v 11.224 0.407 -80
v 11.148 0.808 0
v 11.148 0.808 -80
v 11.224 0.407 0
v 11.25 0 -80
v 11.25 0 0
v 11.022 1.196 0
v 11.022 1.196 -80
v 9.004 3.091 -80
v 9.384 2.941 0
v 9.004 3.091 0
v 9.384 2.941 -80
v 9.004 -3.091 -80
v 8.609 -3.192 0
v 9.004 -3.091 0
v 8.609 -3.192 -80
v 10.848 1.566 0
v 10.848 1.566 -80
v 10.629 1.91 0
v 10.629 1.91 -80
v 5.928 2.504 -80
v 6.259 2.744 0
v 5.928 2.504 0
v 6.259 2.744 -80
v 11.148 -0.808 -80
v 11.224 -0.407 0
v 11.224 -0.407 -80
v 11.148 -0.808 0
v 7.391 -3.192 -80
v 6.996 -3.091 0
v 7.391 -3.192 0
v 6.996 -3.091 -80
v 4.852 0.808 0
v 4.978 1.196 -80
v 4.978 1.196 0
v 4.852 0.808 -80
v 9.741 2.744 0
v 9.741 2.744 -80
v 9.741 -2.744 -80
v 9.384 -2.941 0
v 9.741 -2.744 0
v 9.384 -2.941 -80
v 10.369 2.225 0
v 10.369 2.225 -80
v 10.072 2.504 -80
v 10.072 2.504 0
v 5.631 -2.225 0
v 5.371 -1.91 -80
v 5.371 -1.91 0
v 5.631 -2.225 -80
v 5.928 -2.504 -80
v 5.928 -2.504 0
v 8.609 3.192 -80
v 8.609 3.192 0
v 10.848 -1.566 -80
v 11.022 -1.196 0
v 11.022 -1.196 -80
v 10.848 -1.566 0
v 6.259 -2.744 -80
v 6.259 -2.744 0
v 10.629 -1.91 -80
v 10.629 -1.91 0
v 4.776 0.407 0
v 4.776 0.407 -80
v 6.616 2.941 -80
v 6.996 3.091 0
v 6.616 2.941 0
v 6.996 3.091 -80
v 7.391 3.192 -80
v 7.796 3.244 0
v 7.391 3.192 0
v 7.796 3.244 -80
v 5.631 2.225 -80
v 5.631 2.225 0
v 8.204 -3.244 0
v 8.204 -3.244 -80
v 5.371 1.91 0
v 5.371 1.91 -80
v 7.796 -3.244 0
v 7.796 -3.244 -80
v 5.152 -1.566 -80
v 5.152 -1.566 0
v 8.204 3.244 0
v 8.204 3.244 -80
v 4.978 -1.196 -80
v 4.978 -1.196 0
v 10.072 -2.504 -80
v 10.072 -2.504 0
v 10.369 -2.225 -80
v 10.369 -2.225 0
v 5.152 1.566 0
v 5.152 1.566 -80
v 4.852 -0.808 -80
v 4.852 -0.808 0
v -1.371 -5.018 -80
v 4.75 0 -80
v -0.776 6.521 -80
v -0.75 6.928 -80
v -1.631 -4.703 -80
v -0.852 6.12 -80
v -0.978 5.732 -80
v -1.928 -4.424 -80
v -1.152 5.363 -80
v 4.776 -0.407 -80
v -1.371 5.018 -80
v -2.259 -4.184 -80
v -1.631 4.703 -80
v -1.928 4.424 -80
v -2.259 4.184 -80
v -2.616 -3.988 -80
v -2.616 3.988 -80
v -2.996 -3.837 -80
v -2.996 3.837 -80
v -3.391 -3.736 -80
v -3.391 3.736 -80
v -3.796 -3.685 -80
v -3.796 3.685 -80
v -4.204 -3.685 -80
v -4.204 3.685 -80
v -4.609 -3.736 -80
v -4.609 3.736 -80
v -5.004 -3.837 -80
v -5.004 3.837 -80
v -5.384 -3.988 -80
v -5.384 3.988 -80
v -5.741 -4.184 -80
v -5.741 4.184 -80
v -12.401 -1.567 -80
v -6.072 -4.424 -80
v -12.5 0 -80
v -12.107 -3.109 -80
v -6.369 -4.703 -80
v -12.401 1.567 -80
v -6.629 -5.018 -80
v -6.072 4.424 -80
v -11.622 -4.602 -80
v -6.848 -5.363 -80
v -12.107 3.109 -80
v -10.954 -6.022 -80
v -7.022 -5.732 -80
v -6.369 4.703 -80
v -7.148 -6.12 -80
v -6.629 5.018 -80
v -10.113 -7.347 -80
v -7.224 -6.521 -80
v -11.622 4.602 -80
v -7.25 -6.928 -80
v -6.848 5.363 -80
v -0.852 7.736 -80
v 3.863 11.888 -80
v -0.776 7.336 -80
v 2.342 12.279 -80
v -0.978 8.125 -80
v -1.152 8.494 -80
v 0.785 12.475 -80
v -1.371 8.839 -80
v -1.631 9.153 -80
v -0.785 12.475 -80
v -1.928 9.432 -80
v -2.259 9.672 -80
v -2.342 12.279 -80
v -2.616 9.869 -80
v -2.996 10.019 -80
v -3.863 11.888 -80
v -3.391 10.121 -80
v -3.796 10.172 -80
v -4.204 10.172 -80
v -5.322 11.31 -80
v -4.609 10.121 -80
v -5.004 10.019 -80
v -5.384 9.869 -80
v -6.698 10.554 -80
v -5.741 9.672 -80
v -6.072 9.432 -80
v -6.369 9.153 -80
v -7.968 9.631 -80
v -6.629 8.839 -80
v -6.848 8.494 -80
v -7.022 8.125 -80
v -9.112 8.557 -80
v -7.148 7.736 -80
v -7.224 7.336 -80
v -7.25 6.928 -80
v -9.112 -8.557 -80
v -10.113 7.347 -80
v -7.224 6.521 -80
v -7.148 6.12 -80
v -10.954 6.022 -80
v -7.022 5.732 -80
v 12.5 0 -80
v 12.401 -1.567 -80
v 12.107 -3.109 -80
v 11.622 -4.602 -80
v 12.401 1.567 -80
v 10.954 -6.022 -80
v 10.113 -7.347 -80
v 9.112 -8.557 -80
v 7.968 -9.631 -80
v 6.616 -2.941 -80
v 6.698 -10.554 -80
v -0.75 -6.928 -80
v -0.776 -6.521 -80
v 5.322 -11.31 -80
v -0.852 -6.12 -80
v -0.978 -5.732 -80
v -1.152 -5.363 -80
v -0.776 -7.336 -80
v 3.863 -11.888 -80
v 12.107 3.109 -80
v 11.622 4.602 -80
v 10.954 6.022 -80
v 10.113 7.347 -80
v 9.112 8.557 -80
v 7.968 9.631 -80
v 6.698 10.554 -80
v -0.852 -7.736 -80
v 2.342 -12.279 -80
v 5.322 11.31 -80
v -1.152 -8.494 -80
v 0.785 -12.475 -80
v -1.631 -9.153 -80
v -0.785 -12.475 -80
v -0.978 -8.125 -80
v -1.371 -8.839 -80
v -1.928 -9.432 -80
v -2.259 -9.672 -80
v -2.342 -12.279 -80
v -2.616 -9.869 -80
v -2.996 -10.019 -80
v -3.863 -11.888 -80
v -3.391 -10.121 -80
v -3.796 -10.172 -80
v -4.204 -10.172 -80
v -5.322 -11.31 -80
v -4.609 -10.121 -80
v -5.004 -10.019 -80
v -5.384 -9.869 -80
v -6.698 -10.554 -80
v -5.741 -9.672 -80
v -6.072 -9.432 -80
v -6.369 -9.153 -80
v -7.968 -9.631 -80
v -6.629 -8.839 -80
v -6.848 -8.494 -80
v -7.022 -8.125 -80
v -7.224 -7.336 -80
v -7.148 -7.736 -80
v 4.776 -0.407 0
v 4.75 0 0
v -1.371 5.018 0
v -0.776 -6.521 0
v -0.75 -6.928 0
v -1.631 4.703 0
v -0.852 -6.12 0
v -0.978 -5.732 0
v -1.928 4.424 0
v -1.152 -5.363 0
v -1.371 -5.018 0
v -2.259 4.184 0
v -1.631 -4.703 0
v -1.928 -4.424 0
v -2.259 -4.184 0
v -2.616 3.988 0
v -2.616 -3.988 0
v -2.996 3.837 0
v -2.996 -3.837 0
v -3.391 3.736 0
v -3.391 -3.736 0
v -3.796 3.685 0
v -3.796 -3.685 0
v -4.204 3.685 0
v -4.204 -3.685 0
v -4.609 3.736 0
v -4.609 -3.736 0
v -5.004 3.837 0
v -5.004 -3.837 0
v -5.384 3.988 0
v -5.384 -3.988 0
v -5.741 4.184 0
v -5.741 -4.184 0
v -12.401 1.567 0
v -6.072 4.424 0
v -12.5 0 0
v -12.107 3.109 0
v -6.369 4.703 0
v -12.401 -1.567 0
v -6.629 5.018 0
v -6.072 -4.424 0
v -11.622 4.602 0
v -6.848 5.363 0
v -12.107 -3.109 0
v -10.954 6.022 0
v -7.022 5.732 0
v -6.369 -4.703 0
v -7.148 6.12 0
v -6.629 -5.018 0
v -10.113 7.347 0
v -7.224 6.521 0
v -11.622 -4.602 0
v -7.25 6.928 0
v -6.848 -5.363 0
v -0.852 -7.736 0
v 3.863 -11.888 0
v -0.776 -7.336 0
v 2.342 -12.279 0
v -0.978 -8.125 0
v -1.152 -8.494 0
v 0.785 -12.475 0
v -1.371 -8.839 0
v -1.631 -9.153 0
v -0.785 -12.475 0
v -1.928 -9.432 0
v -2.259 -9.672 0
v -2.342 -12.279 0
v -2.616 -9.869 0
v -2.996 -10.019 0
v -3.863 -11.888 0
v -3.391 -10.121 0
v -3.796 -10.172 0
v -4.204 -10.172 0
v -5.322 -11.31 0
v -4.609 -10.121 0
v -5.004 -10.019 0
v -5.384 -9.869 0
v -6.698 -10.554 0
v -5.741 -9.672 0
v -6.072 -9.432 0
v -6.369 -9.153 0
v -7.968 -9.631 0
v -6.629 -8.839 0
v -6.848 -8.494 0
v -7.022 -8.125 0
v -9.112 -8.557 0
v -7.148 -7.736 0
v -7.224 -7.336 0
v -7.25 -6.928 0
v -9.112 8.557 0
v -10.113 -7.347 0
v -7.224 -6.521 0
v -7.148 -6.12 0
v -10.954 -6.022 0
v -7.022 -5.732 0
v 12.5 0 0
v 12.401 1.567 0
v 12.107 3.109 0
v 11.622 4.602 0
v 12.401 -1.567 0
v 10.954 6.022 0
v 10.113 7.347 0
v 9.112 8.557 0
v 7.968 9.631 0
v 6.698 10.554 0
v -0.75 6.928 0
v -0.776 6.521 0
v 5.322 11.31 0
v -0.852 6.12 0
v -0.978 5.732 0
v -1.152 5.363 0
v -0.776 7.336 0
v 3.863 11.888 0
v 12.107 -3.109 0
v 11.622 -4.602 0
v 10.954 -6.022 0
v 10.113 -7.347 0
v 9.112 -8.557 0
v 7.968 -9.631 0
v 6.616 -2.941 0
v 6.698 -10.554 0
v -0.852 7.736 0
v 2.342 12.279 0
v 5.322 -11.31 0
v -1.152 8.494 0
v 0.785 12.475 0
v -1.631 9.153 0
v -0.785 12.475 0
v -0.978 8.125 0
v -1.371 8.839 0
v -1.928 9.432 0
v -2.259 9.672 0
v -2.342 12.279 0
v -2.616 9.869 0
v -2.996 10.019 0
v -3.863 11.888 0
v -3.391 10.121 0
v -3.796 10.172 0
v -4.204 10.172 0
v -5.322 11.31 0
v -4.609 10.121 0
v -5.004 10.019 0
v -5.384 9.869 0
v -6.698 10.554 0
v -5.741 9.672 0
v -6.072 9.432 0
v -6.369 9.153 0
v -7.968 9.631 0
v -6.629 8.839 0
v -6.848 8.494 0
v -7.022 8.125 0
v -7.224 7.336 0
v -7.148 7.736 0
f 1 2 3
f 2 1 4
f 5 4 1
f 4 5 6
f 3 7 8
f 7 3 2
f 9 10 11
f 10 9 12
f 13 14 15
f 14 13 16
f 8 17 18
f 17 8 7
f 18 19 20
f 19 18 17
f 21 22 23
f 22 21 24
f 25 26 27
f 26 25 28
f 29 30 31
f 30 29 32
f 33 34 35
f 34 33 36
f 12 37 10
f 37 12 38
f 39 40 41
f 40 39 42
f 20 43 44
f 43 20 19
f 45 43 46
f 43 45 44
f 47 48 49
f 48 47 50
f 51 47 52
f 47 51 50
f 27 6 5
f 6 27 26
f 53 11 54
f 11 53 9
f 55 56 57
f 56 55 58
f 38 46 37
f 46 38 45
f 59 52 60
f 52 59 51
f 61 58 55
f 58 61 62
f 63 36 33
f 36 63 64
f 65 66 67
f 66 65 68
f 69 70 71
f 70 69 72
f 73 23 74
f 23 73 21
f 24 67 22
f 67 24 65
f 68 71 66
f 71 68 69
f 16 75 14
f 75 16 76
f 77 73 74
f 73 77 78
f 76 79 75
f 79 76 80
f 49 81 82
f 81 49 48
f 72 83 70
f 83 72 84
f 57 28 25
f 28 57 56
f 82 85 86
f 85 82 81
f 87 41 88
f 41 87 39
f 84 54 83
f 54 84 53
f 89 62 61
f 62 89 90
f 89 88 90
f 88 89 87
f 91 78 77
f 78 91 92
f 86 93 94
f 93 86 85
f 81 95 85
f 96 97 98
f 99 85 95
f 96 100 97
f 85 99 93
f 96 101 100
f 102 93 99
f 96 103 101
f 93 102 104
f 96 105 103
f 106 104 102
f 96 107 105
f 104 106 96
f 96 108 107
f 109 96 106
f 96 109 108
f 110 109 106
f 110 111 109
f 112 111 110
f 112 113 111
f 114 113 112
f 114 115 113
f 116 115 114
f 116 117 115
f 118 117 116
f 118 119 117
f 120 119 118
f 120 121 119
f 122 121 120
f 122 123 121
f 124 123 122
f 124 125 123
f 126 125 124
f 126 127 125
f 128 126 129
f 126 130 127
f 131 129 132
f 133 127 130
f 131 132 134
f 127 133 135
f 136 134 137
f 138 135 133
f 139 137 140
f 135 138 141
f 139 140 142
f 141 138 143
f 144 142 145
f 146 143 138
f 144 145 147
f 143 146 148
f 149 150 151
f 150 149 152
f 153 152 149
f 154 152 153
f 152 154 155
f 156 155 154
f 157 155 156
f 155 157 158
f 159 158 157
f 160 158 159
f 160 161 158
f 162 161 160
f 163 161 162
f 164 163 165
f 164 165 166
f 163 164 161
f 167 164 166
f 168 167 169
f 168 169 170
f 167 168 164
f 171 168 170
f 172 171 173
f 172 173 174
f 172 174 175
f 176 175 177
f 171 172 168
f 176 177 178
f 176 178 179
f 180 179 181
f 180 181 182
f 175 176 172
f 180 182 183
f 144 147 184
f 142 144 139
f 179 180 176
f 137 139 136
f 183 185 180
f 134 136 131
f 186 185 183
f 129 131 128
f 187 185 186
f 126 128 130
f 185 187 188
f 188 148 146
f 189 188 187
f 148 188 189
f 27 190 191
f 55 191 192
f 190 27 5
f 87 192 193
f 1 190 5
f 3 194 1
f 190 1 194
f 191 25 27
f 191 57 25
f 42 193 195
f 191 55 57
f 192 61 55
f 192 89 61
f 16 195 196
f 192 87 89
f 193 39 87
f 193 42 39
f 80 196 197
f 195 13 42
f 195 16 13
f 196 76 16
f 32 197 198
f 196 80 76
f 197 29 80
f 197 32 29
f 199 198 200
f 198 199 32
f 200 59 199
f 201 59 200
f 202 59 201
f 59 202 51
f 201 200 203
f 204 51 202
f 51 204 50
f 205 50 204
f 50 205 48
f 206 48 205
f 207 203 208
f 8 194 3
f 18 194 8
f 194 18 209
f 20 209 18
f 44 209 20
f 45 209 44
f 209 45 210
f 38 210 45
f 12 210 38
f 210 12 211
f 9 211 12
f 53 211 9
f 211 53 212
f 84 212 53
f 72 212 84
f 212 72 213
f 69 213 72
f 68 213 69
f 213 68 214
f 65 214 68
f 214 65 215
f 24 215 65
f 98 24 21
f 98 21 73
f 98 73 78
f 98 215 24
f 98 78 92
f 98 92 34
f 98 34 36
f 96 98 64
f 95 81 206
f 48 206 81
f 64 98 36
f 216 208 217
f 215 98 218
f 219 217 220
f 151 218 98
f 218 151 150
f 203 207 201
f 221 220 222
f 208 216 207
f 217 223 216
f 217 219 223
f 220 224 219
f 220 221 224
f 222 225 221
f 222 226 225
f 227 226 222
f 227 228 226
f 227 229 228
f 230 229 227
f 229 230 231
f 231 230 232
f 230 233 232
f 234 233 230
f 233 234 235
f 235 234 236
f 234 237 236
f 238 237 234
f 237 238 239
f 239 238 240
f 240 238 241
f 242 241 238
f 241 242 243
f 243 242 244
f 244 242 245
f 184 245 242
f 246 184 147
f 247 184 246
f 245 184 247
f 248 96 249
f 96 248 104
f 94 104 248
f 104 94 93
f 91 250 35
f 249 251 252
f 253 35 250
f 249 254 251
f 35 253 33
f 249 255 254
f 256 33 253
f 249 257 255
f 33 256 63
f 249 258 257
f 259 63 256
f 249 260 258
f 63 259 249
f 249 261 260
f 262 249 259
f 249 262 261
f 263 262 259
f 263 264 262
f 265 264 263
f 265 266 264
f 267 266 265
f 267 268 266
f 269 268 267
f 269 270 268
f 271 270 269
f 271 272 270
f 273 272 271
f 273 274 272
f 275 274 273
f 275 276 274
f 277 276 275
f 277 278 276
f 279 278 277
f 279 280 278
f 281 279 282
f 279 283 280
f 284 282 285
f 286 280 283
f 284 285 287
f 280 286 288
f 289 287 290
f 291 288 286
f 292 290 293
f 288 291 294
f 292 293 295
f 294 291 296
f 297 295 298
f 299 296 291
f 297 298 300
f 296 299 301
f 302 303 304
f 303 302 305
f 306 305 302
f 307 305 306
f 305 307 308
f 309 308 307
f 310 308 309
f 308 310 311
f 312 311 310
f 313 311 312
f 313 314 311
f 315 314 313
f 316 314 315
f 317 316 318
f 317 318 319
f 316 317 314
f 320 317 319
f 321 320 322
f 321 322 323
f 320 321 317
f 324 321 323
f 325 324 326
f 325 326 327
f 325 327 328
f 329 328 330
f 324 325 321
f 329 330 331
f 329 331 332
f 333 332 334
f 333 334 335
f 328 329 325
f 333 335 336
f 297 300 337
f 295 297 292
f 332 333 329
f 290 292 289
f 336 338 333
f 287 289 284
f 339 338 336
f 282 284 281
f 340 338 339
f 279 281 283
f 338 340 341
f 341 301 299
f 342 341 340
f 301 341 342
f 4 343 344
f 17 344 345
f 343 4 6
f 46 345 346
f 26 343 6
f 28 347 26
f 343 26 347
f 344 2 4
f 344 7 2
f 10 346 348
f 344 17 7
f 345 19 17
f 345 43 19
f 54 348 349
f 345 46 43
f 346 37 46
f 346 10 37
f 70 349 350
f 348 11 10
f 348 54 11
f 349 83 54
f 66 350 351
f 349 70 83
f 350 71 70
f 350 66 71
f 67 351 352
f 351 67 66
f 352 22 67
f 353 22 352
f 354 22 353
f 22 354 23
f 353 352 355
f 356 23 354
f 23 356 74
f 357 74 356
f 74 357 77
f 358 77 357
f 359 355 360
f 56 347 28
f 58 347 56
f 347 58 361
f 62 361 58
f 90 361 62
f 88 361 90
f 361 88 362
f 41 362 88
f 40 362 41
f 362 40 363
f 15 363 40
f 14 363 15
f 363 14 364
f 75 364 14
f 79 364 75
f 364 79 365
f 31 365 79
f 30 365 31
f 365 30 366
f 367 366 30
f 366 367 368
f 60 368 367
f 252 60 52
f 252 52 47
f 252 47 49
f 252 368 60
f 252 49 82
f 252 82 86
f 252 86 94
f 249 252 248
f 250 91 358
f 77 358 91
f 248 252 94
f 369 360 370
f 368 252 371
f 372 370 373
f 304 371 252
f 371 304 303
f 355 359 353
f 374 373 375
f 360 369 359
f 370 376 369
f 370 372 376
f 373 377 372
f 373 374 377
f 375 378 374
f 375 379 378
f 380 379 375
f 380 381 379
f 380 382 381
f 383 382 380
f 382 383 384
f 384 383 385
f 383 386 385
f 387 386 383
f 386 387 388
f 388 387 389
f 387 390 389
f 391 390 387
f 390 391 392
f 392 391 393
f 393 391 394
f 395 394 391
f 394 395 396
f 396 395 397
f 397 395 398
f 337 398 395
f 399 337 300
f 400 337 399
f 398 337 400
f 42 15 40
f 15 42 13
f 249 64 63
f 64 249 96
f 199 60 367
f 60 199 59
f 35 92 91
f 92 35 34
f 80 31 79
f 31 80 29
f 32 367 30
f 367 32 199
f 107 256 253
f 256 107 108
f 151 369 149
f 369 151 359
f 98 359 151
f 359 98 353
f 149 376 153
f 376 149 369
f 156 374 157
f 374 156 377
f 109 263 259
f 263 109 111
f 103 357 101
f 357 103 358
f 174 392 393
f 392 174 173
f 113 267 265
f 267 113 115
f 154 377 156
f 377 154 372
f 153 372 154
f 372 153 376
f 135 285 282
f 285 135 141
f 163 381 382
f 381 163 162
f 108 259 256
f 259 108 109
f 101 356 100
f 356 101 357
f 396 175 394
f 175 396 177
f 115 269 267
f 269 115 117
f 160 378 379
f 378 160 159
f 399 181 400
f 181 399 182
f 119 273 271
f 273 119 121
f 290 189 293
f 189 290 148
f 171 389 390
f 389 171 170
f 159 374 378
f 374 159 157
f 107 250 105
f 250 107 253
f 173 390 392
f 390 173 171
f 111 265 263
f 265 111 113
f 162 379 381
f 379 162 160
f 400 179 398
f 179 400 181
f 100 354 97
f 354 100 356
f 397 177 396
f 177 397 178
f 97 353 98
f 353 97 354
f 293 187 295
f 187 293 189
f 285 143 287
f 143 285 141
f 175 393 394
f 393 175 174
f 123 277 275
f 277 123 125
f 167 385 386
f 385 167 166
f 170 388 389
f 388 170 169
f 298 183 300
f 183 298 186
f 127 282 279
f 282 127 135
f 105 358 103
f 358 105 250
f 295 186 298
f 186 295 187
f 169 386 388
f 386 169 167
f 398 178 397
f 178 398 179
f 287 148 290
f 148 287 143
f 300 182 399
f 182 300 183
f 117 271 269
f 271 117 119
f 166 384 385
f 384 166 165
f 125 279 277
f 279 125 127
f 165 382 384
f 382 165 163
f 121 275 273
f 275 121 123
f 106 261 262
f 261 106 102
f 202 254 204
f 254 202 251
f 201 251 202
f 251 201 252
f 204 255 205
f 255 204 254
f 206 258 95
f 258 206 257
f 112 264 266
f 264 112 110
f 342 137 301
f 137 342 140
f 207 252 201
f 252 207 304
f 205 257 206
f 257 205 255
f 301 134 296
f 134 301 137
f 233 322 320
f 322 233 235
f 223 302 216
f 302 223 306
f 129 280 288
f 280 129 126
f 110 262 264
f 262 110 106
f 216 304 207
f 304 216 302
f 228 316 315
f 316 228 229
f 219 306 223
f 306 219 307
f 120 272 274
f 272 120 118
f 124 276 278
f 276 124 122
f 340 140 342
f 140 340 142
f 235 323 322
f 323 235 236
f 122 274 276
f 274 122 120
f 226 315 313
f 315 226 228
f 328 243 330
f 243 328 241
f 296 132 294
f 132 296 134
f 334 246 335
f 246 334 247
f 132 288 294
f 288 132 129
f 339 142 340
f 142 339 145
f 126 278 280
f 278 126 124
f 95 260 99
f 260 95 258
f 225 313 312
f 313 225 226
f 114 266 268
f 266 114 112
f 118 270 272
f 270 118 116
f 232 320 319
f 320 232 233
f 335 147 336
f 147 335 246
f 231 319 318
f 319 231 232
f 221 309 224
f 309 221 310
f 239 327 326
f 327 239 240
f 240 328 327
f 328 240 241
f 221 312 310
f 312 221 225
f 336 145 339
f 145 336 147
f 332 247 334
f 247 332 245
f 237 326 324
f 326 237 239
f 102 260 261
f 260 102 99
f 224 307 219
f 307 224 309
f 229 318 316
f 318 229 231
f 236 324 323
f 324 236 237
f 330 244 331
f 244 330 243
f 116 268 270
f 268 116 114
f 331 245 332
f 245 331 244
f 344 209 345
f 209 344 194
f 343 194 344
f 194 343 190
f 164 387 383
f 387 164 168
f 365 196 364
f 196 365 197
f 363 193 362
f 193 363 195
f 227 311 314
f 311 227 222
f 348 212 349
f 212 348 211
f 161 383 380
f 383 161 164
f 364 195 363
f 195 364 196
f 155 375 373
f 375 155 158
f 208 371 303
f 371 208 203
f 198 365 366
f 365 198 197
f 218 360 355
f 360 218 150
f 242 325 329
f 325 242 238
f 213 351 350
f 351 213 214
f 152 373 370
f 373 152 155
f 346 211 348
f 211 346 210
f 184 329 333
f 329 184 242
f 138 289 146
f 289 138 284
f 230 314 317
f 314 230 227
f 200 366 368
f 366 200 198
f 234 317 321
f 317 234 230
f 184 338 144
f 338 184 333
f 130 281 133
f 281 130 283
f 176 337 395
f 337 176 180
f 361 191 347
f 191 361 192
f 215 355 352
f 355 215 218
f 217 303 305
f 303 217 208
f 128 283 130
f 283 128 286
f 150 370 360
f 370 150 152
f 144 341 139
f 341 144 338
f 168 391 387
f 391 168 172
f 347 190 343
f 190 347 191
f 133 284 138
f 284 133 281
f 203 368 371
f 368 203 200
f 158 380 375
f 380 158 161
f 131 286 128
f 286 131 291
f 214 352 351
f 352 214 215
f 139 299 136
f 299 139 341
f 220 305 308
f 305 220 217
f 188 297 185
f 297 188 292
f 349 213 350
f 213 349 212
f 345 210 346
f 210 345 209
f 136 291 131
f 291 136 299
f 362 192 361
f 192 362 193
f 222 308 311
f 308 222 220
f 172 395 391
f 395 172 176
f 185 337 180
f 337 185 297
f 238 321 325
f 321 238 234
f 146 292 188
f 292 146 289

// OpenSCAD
$fn = 50;


difference() {
	union() {
		translate(v = [0, 0, -80.0000000000]) {
			cylinder(h = 80, r = 12.5000000000);
		}
	}
	union() {
		#translate(v = [8.0000000000, 0.0000000000, -80]) {
			cylinder(h = 80, r = 3.2500000000);
		}
		#translate(v = [-4.0000000000, 6.9282032303, -80]) {
			cylinder(h = 80, r = 3.2500000000);
		}
		#translate(v = [-4.0000000000, -6.9282032303, -80]) {
			cylinder(h = 80, r = 3.2500000000);
		}
	}
}
